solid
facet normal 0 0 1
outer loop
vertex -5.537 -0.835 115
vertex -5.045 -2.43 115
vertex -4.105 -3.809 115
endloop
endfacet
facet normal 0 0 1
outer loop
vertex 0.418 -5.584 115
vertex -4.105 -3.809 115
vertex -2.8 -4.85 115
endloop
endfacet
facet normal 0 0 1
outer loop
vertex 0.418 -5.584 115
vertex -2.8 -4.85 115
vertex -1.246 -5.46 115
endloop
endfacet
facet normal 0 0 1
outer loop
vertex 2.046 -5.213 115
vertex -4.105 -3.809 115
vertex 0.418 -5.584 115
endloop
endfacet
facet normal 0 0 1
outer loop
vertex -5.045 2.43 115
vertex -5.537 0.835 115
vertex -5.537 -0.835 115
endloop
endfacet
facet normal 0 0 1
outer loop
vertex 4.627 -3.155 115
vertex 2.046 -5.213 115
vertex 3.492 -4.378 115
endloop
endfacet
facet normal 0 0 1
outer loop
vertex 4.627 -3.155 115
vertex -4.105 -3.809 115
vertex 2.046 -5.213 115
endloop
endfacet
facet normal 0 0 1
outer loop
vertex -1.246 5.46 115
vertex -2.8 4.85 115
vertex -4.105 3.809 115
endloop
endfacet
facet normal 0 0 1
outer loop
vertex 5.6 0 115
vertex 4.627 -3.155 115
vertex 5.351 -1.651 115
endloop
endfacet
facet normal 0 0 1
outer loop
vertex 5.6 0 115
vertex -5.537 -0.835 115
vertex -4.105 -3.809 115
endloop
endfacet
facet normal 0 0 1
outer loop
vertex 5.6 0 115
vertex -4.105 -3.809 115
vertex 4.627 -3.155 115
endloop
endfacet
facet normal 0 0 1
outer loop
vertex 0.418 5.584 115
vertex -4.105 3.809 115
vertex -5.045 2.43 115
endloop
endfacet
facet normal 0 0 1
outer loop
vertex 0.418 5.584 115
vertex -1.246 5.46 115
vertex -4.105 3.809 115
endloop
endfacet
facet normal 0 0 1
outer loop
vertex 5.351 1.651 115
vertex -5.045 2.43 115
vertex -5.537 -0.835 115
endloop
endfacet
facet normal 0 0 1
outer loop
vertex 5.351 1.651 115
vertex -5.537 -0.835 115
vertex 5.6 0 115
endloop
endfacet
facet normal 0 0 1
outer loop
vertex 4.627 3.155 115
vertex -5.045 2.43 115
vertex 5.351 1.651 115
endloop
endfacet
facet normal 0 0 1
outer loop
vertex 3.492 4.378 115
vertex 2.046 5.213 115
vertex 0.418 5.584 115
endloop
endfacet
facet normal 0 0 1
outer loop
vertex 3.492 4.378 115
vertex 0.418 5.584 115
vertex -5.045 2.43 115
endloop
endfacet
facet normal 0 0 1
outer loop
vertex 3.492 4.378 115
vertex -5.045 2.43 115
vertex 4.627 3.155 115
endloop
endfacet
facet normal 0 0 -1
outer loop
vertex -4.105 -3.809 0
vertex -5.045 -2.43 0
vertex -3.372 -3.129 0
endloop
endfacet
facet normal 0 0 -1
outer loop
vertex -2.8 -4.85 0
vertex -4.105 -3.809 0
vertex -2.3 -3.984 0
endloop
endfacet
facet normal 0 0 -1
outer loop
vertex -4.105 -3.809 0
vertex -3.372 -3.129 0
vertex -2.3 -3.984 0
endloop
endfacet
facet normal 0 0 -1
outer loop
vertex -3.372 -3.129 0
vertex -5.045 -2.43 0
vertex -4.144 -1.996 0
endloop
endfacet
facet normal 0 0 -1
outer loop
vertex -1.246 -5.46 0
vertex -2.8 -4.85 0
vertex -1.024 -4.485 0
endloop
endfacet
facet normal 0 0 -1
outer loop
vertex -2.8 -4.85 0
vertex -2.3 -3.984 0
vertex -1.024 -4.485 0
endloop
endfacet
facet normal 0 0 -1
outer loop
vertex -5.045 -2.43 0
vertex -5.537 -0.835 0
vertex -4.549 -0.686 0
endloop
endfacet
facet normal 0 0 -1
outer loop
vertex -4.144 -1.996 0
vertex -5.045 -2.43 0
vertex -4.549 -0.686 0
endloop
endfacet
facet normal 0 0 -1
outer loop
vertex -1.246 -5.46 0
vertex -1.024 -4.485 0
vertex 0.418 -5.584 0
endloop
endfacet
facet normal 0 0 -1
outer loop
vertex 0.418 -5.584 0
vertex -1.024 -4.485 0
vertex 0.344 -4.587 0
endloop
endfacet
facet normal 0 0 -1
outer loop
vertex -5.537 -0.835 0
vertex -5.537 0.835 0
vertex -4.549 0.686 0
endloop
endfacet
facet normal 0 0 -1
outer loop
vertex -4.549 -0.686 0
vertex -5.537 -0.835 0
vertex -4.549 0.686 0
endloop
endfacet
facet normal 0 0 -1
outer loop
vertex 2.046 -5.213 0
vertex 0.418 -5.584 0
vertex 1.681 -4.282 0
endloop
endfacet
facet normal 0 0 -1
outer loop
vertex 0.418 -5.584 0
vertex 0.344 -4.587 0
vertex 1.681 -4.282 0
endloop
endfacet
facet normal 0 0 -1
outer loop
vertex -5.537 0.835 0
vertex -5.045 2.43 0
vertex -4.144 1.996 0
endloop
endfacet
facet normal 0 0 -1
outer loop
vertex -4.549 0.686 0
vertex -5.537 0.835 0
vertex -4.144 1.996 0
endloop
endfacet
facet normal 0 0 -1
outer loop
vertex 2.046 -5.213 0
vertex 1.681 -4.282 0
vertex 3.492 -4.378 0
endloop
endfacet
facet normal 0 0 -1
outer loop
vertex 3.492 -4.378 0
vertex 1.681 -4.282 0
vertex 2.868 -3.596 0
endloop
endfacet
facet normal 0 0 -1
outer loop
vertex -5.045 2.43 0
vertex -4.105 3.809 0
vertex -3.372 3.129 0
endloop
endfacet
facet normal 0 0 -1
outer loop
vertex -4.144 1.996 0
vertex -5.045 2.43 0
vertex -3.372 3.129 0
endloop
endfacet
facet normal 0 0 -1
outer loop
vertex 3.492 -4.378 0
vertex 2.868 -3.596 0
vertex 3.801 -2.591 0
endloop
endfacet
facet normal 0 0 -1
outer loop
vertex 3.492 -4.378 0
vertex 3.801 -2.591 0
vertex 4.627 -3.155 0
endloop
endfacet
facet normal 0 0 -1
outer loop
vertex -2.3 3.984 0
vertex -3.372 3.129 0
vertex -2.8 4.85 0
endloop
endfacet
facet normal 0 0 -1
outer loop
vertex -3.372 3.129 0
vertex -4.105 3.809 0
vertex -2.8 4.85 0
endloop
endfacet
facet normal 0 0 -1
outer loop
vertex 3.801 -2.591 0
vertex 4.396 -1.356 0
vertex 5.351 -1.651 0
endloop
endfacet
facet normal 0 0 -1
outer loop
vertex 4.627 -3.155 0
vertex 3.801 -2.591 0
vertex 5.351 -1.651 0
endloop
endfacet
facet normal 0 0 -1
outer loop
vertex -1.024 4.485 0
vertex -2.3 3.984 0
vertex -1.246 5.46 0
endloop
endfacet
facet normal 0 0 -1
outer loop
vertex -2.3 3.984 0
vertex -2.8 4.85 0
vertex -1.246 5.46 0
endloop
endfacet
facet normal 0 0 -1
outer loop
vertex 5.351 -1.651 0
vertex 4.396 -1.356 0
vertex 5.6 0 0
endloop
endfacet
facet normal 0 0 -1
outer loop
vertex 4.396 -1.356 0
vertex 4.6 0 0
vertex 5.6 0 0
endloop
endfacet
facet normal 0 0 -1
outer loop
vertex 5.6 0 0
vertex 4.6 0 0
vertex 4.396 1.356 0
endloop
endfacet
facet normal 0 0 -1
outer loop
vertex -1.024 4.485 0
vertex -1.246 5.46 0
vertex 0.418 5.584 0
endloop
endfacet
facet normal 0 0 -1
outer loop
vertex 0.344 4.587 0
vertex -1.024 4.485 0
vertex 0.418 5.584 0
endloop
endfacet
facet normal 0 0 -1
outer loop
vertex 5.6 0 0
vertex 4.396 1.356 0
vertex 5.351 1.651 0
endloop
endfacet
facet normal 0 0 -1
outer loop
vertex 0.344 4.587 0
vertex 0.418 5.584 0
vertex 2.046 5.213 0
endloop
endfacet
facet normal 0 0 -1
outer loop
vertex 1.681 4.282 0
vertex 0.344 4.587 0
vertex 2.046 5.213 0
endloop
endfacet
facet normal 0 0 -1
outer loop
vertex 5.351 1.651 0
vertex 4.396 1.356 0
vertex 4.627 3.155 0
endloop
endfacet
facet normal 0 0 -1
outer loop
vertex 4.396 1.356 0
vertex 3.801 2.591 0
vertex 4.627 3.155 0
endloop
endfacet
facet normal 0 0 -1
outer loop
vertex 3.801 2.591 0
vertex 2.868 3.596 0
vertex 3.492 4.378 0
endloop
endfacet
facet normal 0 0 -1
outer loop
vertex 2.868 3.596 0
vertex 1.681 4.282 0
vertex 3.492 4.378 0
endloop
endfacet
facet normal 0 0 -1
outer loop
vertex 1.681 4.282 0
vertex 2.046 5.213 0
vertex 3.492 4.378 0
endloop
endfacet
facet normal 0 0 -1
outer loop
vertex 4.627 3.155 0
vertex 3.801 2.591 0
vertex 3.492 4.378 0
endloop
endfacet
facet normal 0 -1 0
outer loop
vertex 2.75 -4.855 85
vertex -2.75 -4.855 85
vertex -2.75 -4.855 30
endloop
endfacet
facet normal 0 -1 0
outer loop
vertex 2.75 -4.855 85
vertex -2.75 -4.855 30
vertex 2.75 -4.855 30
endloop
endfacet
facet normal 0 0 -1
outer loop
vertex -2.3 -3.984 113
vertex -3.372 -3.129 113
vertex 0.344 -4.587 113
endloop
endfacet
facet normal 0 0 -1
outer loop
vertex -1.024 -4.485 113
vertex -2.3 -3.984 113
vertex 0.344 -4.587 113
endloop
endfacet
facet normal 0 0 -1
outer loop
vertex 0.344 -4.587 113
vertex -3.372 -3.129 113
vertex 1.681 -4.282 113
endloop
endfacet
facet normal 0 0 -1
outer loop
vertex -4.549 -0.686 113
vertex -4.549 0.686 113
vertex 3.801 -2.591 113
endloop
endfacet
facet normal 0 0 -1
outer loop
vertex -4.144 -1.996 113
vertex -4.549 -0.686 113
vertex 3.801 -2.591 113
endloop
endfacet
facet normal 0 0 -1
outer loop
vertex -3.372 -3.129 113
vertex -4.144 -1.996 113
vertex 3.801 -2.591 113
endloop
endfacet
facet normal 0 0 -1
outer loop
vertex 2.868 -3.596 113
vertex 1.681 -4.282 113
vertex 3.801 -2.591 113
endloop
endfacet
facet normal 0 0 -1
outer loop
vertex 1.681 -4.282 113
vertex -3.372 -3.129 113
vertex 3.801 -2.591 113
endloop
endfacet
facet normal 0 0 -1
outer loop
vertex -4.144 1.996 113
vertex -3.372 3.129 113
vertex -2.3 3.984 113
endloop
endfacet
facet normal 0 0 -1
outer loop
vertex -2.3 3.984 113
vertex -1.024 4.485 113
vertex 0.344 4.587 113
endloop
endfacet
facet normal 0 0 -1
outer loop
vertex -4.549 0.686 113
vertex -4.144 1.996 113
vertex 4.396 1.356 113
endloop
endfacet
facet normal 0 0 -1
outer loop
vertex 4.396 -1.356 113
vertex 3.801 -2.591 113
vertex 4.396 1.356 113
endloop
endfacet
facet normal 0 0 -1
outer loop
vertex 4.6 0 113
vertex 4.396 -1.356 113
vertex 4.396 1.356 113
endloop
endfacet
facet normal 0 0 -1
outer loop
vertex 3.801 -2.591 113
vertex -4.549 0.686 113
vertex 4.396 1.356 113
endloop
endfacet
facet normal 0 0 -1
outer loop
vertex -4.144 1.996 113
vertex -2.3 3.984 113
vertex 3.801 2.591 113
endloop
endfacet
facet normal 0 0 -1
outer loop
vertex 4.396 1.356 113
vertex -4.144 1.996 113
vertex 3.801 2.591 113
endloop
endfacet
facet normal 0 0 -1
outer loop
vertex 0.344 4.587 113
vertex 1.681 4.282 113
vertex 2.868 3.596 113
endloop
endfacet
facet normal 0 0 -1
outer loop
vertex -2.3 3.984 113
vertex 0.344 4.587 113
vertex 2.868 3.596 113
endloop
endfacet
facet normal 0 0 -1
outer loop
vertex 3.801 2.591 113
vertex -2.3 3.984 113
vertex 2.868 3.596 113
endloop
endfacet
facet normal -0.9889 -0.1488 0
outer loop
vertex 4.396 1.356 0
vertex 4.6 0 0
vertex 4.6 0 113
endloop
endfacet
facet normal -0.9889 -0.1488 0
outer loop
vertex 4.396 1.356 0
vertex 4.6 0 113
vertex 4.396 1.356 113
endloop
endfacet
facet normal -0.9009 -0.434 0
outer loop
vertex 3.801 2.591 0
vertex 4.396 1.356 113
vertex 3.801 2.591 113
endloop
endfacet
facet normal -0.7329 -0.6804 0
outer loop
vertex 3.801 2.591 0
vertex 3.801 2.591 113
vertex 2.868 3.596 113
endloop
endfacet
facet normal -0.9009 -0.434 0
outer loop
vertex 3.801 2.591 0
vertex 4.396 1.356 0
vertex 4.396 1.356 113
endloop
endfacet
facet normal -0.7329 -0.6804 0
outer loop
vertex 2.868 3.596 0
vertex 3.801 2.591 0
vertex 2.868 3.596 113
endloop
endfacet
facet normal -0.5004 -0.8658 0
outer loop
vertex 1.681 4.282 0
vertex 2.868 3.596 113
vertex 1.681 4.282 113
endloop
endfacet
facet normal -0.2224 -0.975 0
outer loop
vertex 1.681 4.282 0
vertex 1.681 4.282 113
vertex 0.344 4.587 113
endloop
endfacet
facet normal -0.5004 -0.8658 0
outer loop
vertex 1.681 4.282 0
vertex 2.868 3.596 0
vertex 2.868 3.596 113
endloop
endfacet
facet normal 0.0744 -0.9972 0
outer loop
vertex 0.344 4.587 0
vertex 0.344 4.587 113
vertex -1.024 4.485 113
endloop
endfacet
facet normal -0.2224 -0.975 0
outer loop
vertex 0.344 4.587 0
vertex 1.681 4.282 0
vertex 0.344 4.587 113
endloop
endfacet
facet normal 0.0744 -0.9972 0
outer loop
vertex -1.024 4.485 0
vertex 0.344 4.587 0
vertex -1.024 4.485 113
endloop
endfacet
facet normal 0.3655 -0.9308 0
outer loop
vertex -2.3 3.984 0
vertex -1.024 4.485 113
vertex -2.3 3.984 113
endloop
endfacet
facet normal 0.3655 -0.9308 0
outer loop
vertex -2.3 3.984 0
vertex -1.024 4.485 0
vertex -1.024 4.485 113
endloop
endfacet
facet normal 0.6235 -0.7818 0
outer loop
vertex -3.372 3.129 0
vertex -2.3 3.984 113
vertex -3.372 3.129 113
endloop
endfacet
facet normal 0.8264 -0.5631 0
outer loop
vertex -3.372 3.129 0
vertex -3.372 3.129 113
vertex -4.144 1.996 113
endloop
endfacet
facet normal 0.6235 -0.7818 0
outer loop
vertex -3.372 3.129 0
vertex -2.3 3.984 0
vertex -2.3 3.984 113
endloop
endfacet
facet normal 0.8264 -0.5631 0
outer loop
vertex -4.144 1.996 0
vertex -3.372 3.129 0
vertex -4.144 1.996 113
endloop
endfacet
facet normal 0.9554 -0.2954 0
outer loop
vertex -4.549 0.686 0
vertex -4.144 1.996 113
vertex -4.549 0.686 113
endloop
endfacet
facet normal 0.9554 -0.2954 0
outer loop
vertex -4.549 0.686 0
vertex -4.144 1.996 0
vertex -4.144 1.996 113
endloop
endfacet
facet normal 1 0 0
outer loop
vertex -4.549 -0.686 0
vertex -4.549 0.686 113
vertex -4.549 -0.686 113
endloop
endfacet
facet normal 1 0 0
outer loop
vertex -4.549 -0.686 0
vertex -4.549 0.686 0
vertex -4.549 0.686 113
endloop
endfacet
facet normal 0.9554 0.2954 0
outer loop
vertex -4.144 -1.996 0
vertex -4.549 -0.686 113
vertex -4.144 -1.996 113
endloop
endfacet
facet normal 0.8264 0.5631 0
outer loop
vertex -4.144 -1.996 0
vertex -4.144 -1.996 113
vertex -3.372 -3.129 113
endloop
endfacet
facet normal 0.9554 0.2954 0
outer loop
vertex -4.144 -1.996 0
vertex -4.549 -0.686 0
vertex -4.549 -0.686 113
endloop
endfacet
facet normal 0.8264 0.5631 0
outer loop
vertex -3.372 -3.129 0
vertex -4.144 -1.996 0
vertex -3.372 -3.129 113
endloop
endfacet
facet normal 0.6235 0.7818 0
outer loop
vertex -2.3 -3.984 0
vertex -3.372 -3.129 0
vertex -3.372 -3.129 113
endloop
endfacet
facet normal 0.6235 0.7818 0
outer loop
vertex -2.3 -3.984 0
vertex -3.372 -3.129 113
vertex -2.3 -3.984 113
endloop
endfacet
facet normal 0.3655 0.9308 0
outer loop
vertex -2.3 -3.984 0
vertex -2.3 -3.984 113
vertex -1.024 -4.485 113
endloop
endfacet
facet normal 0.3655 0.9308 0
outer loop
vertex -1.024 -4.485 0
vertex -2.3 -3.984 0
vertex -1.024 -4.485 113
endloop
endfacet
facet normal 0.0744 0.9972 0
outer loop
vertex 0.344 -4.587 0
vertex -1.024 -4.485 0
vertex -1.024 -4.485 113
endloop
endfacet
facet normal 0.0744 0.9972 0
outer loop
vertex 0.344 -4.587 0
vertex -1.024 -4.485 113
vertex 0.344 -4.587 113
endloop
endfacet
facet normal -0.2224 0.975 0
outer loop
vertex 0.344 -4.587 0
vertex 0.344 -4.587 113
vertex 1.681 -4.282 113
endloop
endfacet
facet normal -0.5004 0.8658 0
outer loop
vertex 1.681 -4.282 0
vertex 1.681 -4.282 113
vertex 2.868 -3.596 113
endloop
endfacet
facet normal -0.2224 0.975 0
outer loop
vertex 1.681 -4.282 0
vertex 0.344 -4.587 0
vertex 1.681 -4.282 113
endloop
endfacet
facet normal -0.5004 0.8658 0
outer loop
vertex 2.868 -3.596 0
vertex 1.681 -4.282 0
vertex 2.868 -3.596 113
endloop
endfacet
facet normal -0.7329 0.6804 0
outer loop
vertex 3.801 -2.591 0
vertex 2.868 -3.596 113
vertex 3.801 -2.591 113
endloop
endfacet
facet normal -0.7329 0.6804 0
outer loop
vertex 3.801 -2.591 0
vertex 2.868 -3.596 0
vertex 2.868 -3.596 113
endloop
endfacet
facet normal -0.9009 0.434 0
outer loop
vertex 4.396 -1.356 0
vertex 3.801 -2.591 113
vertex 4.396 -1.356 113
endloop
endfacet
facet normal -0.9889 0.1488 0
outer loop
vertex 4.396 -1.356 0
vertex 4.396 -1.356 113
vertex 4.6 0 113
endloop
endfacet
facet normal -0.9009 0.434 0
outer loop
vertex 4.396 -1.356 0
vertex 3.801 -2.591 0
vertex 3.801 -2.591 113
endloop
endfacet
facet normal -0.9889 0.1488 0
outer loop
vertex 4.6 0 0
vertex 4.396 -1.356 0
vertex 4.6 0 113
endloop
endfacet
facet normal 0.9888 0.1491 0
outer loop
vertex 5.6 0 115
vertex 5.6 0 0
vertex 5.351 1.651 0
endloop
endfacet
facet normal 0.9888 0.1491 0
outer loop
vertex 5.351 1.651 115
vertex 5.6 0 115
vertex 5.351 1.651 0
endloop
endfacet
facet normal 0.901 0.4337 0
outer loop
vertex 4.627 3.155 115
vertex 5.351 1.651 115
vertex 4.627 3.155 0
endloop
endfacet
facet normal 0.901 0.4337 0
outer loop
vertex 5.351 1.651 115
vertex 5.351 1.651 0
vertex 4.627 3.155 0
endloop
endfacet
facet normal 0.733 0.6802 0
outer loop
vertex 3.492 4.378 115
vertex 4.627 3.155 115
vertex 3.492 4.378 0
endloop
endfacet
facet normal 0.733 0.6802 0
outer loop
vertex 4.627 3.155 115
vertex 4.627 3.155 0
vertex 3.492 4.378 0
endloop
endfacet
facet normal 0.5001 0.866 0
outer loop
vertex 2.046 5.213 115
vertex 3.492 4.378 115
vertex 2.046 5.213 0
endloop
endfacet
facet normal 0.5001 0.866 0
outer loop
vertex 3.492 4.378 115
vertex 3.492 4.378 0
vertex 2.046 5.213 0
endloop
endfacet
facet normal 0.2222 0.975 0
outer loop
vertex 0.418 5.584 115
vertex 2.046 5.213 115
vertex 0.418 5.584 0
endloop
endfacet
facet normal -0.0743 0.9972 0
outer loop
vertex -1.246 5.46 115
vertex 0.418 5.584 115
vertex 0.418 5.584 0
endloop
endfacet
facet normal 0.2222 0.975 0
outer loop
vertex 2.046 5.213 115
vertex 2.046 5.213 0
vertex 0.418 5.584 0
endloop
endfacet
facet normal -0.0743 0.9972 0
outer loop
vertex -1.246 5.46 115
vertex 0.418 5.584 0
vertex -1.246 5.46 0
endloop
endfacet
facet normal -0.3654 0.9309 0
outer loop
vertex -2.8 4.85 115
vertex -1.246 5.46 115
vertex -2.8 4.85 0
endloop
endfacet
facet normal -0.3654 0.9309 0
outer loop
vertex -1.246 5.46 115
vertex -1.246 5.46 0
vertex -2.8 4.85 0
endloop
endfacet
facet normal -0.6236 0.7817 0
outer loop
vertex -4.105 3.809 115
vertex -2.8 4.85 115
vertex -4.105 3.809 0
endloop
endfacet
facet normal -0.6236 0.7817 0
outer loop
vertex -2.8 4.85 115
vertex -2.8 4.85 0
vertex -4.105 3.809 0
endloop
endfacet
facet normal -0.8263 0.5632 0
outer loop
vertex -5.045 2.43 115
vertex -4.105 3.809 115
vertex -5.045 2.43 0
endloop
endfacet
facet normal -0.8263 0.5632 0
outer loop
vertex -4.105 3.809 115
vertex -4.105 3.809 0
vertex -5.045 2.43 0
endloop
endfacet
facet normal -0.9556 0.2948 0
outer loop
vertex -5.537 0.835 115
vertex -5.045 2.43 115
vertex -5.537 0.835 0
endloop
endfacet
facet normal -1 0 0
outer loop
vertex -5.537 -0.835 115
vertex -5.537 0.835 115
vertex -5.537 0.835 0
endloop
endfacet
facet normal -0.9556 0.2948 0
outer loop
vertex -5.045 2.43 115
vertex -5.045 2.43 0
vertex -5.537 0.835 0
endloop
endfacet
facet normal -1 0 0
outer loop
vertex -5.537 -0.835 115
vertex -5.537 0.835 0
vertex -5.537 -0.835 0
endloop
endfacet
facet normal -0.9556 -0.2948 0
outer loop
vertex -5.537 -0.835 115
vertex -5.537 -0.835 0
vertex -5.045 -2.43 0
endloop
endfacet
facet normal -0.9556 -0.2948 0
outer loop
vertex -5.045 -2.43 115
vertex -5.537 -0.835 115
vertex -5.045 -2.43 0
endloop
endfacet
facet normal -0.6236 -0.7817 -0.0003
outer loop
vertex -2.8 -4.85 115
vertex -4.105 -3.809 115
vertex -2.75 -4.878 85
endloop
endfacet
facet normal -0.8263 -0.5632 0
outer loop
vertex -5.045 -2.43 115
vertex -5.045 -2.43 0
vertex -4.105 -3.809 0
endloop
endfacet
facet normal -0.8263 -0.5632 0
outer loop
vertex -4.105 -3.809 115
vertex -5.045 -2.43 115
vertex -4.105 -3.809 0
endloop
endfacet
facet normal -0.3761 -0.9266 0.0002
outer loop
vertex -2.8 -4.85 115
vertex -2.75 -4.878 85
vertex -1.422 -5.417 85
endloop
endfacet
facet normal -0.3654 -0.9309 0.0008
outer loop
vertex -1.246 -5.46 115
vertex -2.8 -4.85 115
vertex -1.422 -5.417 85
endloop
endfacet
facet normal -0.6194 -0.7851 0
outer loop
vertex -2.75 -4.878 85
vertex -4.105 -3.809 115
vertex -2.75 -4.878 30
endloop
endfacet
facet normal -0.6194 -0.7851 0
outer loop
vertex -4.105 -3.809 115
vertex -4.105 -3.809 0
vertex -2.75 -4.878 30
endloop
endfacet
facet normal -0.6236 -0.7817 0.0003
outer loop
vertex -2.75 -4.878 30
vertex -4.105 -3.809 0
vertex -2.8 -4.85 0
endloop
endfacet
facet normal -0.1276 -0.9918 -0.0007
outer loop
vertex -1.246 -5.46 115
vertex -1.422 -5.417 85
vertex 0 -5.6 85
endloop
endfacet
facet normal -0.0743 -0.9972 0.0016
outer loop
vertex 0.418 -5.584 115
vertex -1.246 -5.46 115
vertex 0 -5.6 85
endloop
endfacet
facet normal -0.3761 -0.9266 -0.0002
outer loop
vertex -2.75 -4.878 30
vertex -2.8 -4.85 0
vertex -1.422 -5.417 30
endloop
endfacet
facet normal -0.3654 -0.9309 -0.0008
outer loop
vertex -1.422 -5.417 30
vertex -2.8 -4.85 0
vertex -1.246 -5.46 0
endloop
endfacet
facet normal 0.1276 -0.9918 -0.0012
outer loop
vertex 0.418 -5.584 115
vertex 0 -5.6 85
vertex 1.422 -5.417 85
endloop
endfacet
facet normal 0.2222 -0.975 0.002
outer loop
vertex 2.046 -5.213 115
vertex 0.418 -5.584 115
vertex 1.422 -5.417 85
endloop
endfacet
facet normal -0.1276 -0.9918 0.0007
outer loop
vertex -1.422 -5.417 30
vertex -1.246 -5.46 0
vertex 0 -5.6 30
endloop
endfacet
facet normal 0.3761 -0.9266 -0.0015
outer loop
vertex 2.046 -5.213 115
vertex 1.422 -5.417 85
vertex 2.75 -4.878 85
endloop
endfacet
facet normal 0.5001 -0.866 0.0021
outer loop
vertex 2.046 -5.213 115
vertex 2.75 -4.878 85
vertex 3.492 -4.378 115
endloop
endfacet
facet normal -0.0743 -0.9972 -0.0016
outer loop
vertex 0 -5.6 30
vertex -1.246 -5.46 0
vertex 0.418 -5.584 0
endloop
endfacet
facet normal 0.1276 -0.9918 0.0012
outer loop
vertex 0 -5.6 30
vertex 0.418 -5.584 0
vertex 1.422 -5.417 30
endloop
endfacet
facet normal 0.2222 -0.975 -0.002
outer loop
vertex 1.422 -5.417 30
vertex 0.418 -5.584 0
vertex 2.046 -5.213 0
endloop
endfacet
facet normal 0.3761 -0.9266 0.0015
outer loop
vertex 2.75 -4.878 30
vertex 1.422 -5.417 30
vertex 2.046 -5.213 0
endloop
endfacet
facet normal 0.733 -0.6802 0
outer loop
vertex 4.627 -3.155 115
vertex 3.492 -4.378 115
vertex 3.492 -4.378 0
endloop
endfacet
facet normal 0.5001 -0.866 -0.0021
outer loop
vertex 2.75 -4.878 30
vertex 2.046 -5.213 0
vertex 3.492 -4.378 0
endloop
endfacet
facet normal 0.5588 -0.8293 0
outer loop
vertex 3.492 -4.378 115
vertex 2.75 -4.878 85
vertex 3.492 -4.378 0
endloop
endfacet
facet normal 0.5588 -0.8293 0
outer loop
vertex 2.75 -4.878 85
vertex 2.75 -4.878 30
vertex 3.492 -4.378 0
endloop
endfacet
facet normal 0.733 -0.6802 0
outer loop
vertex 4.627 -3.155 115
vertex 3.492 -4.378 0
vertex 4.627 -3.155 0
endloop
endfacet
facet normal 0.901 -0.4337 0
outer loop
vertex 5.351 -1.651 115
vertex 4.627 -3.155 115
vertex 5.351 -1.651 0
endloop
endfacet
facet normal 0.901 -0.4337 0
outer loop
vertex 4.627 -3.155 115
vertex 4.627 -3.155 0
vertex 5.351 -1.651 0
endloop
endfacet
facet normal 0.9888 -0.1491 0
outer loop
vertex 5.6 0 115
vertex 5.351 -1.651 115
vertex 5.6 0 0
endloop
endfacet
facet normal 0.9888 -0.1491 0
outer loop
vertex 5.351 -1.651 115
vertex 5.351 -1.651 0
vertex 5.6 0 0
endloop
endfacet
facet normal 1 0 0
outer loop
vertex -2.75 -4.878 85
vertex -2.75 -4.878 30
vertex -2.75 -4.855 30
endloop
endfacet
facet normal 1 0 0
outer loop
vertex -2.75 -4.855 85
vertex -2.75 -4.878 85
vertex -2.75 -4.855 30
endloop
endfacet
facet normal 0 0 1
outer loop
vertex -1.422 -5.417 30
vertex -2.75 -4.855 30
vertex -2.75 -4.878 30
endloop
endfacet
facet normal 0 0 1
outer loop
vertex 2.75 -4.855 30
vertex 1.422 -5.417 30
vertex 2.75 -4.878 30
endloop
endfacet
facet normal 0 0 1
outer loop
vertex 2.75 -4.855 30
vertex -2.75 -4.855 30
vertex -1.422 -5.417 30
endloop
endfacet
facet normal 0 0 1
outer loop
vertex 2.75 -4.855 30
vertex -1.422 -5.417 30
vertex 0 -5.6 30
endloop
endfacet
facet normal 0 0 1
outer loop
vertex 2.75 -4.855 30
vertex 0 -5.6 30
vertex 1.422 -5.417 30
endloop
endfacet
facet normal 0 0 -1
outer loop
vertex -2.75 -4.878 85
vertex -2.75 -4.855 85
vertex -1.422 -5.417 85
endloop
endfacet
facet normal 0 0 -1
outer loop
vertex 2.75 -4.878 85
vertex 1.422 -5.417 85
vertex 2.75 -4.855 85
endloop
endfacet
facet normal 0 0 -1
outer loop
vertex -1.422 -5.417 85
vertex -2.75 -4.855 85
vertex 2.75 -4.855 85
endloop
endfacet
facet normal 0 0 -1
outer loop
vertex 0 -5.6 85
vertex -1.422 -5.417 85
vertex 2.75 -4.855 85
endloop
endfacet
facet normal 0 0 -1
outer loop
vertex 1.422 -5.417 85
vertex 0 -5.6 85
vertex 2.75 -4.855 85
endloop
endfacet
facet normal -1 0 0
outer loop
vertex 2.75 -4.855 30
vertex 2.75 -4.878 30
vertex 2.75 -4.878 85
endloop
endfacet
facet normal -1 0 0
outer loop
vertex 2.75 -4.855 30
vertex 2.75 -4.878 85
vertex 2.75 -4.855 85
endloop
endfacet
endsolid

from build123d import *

# Parameters (mm, degrees)
SKETCH1_R           = 5.6
BOSS_EXTRUDE1_DEPTH = 115
SKETCH1_3_R         = 4.6
CUT_EXTRUDE1_DEPTH  = 113
SKETCH2_W           = 5.5
SKETCH2_H           = 1.489117796
CUT_EXTRUDE2_DEPTH  = 55


with BuildPart() as part:
    # Sketch1 → Boss-Extrude1 (new body)
    with BuildSketch(Plane.XY):
        Circle(SKETCH1_R)
    extrude(amount=BOSS_EXTRUDE1_DEPTH)

    # Sketch1<3> → Cut-Extrude1 (cut)
    with BuildSketch(Plane.XY):
        Circle(SKETCH1_3_R)
    extrude(amount=CUT_EXTRUDE1_DEPTH, mode=Mode.SUBTRACT)

    # Sketch2 → Cut-Extrude2 (cut)
    with BuildSketch(Plane.XY.offset(85)):
        with Locations((0, -5.6)):
            Rectangle(SKETCH2_W, SKETCH2_H)
    extrude(amount=-CUT_EXTRUDE2_DEPTH, mode=Mode.SUBTRACT)


solid = part.part
